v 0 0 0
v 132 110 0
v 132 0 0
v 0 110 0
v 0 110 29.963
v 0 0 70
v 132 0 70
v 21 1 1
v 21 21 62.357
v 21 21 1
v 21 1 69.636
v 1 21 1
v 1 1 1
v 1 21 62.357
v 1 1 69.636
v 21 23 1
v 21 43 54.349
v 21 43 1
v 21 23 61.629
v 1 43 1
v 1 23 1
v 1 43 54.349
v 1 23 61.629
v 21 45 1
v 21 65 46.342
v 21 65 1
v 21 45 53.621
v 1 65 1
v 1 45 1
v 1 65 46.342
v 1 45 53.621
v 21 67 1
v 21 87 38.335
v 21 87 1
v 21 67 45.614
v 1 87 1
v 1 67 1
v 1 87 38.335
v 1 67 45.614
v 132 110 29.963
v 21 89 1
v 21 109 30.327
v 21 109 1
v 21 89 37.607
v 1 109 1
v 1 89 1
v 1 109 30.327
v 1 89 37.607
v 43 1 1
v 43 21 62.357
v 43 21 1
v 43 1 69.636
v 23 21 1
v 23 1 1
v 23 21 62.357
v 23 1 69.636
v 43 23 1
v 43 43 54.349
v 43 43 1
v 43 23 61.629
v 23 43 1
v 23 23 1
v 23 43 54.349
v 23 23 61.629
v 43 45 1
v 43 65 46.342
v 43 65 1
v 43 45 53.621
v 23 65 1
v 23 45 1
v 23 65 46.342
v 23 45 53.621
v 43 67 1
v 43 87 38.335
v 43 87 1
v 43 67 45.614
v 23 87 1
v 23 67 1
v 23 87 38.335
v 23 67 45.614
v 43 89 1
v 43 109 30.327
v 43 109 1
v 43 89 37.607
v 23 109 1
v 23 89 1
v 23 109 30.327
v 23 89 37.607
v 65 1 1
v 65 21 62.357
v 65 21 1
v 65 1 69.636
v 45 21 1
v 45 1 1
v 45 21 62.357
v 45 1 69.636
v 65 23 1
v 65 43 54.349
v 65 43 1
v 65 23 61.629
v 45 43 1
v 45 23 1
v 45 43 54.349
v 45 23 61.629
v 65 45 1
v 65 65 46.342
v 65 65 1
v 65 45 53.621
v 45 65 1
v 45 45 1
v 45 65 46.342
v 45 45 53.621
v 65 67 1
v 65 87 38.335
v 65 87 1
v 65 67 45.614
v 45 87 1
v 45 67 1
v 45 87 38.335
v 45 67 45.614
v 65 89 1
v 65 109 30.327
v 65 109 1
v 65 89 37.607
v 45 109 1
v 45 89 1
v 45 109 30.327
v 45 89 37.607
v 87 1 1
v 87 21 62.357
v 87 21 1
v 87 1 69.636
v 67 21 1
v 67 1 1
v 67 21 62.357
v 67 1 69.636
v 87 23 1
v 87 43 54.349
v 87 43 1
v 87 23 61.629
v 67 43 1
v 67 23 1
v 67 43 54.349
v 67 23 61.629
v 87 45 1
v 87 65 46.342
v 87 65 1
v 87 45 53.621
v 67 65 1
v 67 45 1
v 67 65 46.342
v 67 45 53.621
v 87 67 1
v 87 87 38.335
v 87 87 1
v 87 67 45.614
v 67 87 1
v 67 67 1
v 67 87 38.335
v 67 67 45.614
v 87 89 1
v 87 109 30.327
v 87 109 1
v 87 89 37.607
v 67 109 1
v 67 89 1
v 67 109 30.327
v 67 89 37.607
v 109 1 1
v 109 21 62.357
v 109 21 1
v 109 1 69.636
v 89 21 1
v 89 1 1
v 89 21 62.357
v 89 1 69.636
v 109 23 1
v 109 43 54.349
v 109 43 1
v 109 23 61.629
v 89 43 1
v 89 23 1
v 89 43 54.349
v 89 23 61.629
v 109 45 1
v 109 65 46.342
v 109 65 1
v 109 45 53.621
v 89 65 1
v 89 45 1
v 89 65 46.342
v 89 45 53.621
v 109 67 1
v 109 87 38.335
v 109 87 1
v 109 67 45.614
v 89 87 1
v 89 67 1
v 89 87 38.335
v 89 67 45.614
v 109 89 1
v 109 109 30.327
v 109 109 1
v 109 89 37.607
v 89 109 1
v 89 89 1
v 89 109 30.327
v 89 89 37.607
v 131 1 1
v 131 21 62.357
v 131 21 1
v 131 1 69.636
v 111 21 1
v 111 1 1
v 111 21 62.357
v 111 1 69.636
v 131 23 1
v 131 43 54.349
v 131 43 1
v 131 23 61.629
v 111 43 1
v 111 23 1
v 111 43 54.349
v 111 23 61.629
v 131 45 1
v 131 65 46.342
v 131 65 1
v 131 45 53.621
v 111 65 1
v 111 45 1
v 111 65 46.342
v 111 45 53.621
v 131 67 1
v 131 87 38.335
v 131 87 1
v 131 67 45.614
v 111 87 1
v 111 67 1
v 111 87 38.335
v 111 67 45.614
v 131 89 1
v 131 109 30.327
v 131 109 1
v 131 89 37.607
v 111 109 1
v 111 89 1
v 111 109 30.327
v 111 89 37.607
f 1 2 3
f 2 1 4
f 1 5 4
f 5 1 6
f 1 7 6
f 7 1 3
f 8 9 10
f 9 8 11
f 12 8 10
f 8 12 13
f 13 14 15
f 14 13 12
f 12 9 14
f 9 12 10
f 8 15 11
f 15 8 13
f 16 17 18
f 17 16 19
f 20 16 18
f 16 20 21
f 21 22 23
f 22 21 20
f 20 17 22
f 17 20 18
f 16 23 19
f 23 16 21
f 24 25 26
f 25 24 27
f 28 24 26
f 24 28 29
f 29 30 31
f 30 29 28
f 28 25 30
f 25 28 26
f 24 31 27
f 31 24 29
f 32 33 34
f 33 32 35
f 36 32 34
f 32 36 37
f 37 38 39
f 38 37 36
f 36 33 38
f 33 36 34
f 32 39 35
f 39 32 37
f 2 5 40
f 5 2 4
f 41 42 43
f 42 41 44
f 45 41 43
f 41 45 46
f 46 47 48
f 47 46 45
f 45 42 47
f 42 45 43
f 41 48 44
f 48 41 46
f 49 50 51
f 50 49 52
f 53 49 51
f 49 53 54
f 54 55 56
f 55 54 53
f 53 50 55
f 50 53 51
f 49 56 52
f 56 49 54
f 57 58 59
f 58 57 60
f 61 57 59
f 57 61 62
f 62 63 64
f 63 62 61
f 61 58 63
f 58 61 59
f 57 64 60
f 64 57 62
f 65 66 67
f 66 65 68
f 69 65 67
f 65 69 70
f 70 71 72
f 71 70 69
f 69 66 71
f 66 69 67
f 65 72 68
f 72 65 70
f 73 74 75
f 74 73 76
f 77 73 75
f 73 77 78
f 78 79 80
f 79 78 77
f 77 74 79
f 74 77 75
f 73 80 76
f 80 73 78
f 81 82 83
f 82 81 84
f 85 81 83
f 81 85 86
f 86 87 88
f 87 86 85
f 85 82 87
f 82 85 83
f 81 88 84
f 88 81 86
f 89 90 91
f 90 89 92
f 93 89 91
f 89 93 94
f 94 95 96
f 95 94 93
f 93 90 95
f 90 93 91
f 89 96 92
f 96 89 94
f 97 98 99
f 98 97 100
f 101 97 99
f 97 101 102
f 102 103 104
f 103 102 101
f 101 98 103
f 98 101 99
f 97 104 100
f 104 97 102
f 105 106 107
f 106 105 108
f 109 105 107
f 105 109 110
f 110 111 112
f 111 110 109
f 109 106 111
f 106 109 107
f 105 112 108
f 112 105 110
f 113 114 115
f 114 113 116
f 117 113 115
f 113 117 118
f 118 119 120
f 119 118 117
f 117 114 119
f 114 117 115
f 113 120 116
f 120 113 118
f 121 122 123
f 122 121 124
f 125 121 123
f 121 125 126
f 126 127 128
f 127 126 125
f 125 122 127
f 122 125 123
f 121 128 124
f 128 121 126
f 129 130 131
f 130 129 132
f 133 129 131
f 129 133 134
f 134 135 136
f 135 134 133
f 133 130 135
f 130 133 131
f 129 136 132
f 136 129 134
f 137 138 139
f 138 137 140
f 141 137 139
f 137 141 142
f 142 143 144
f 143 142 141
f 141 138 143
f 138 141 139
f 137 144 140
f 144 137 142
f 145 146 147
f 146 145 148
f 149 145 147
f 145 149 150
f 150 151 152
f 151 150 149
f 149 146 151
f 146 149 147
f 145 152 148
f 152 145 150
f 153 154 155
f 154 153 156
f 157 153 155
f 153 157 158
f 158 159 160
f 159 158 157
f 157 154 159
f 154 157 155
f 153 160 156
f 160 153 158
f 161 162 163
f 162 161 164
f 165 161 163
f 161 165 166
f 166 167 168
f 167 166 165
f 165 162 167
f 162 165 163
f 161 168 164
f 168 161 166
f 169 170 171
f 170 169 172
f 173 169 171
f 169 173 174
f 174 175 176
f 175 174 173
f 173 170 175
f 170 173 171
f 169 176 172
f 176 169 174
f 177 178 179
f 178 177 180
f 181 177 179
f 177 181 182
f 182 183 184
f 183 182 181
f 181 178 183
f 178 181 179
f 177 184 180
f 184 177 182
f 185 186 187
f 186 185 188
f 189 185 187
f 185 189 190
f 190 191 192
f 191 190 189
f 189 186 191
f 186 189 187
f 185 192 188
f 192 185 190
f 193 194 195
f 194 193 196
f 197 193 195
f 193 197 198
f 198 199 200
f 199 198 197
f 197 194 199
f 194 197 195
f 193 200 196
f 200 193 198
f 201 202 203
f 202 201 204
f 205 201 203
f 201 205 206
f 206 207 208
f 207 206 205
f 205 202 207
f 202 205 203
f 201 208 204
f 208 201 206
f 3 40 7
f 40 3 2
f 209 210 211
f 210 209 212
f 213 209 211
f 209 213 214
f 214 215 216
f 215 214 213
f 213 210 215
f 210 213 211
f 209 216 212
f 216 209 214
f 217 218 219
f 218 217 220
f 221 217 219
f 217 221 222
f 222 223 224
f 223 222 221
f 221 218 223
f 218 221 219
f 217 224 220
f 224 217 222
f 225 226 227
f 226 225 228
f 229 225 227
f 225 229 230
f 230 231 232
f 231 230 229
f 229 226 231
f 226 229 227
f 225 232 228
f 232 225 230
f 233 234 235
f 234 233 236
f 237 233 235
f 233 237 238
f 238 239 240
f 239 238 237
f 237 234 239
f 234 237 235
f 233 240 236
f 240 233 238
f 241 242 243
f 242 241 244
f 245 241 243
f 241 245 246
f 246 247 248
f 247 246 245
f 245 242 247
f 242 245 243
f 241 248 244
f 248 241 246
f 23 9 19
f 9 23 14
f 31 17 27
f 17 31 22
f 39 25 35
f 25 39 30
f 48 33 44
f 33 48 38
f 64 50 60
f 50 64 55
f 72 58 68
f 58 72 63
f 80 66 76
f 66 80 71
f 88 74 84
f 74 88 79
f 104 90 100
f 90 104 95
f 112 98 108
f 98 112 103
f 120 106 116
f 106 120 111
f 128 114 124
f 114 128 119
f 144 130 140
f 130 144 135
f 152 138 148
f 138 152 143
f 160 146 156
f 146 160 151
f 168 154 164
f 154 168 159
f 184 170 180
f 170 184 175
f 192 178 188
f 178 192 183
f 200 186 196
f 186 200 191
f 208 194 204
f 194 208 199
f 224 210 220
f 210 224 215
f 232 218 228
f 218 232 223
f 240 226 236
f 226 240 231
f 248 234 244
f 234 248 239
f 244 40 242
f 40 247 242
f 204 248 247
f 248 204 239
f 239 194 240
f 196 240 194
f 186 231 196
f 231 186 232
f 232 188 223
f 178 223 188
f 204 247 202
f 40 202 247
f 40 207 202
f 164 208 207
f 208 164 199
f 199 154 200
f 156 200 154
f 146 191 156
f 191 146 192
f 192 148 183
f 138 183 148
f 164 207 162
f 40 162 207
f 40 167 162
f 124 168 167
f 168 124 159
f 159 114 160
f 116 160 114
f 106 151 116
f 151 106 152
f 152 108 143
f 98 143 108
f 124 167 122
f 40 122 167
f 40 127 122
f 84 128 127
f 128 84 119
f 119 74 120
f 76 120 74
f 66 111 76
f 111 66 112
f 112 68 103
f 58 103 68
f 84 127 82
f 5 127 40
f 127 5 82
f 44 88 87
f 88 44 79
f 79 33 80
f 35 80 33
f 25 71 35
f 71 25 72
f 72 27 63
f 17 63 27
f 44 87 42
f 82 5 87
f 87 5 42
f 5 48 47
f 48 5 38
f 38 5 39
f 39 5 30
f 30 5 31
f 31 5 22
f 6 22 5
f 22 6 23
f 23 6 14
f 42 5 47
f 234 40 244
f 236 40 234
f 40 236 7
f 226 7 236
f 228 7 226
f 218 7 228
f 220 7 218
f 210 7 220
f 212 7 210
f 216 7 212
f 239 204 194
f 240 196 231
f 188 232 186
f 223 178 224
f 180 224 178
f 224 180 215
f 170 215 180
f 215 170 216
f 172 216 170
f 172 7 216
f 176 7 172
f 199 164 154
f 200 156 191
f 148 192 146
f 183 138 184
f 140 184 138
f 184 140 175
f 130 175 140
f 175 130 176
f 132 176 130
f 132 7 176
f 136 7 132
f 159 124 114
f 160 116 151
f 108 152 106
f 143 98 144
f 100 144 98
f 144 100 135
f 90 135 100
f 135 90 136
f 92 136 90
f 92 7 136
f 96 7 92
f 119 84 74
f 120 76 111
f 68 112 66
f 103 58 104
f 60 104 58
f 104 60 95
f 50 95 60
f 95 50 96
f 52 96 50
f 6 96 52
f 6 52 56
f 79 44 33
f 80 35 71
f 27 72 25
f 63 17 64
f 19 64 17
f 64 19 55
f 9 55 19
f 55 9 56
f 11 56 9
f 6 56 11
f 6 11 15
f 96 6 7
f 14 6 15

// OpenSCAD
nbx=5;
nby=4;
sz=20;
wallsize=1;
myh=70;

difference()
{
	for (x = [0:nbx])
		for (y = [0:nby])
			translate([x*(sz+wallsize*2), y*(sz+wallsize*2), 0]) difference()
			{
				cube([sz+wallsize*2, sz+wallsize*2, myh]);
				translate([wallsize, wallsize, wallsize]) cube([sz, sz, myh]);
			}
	translate([-1, 0, myh]) rotate([-20, 0, 0]) cube([nbx*sz*2, nby*sz*2, myh]);
}
